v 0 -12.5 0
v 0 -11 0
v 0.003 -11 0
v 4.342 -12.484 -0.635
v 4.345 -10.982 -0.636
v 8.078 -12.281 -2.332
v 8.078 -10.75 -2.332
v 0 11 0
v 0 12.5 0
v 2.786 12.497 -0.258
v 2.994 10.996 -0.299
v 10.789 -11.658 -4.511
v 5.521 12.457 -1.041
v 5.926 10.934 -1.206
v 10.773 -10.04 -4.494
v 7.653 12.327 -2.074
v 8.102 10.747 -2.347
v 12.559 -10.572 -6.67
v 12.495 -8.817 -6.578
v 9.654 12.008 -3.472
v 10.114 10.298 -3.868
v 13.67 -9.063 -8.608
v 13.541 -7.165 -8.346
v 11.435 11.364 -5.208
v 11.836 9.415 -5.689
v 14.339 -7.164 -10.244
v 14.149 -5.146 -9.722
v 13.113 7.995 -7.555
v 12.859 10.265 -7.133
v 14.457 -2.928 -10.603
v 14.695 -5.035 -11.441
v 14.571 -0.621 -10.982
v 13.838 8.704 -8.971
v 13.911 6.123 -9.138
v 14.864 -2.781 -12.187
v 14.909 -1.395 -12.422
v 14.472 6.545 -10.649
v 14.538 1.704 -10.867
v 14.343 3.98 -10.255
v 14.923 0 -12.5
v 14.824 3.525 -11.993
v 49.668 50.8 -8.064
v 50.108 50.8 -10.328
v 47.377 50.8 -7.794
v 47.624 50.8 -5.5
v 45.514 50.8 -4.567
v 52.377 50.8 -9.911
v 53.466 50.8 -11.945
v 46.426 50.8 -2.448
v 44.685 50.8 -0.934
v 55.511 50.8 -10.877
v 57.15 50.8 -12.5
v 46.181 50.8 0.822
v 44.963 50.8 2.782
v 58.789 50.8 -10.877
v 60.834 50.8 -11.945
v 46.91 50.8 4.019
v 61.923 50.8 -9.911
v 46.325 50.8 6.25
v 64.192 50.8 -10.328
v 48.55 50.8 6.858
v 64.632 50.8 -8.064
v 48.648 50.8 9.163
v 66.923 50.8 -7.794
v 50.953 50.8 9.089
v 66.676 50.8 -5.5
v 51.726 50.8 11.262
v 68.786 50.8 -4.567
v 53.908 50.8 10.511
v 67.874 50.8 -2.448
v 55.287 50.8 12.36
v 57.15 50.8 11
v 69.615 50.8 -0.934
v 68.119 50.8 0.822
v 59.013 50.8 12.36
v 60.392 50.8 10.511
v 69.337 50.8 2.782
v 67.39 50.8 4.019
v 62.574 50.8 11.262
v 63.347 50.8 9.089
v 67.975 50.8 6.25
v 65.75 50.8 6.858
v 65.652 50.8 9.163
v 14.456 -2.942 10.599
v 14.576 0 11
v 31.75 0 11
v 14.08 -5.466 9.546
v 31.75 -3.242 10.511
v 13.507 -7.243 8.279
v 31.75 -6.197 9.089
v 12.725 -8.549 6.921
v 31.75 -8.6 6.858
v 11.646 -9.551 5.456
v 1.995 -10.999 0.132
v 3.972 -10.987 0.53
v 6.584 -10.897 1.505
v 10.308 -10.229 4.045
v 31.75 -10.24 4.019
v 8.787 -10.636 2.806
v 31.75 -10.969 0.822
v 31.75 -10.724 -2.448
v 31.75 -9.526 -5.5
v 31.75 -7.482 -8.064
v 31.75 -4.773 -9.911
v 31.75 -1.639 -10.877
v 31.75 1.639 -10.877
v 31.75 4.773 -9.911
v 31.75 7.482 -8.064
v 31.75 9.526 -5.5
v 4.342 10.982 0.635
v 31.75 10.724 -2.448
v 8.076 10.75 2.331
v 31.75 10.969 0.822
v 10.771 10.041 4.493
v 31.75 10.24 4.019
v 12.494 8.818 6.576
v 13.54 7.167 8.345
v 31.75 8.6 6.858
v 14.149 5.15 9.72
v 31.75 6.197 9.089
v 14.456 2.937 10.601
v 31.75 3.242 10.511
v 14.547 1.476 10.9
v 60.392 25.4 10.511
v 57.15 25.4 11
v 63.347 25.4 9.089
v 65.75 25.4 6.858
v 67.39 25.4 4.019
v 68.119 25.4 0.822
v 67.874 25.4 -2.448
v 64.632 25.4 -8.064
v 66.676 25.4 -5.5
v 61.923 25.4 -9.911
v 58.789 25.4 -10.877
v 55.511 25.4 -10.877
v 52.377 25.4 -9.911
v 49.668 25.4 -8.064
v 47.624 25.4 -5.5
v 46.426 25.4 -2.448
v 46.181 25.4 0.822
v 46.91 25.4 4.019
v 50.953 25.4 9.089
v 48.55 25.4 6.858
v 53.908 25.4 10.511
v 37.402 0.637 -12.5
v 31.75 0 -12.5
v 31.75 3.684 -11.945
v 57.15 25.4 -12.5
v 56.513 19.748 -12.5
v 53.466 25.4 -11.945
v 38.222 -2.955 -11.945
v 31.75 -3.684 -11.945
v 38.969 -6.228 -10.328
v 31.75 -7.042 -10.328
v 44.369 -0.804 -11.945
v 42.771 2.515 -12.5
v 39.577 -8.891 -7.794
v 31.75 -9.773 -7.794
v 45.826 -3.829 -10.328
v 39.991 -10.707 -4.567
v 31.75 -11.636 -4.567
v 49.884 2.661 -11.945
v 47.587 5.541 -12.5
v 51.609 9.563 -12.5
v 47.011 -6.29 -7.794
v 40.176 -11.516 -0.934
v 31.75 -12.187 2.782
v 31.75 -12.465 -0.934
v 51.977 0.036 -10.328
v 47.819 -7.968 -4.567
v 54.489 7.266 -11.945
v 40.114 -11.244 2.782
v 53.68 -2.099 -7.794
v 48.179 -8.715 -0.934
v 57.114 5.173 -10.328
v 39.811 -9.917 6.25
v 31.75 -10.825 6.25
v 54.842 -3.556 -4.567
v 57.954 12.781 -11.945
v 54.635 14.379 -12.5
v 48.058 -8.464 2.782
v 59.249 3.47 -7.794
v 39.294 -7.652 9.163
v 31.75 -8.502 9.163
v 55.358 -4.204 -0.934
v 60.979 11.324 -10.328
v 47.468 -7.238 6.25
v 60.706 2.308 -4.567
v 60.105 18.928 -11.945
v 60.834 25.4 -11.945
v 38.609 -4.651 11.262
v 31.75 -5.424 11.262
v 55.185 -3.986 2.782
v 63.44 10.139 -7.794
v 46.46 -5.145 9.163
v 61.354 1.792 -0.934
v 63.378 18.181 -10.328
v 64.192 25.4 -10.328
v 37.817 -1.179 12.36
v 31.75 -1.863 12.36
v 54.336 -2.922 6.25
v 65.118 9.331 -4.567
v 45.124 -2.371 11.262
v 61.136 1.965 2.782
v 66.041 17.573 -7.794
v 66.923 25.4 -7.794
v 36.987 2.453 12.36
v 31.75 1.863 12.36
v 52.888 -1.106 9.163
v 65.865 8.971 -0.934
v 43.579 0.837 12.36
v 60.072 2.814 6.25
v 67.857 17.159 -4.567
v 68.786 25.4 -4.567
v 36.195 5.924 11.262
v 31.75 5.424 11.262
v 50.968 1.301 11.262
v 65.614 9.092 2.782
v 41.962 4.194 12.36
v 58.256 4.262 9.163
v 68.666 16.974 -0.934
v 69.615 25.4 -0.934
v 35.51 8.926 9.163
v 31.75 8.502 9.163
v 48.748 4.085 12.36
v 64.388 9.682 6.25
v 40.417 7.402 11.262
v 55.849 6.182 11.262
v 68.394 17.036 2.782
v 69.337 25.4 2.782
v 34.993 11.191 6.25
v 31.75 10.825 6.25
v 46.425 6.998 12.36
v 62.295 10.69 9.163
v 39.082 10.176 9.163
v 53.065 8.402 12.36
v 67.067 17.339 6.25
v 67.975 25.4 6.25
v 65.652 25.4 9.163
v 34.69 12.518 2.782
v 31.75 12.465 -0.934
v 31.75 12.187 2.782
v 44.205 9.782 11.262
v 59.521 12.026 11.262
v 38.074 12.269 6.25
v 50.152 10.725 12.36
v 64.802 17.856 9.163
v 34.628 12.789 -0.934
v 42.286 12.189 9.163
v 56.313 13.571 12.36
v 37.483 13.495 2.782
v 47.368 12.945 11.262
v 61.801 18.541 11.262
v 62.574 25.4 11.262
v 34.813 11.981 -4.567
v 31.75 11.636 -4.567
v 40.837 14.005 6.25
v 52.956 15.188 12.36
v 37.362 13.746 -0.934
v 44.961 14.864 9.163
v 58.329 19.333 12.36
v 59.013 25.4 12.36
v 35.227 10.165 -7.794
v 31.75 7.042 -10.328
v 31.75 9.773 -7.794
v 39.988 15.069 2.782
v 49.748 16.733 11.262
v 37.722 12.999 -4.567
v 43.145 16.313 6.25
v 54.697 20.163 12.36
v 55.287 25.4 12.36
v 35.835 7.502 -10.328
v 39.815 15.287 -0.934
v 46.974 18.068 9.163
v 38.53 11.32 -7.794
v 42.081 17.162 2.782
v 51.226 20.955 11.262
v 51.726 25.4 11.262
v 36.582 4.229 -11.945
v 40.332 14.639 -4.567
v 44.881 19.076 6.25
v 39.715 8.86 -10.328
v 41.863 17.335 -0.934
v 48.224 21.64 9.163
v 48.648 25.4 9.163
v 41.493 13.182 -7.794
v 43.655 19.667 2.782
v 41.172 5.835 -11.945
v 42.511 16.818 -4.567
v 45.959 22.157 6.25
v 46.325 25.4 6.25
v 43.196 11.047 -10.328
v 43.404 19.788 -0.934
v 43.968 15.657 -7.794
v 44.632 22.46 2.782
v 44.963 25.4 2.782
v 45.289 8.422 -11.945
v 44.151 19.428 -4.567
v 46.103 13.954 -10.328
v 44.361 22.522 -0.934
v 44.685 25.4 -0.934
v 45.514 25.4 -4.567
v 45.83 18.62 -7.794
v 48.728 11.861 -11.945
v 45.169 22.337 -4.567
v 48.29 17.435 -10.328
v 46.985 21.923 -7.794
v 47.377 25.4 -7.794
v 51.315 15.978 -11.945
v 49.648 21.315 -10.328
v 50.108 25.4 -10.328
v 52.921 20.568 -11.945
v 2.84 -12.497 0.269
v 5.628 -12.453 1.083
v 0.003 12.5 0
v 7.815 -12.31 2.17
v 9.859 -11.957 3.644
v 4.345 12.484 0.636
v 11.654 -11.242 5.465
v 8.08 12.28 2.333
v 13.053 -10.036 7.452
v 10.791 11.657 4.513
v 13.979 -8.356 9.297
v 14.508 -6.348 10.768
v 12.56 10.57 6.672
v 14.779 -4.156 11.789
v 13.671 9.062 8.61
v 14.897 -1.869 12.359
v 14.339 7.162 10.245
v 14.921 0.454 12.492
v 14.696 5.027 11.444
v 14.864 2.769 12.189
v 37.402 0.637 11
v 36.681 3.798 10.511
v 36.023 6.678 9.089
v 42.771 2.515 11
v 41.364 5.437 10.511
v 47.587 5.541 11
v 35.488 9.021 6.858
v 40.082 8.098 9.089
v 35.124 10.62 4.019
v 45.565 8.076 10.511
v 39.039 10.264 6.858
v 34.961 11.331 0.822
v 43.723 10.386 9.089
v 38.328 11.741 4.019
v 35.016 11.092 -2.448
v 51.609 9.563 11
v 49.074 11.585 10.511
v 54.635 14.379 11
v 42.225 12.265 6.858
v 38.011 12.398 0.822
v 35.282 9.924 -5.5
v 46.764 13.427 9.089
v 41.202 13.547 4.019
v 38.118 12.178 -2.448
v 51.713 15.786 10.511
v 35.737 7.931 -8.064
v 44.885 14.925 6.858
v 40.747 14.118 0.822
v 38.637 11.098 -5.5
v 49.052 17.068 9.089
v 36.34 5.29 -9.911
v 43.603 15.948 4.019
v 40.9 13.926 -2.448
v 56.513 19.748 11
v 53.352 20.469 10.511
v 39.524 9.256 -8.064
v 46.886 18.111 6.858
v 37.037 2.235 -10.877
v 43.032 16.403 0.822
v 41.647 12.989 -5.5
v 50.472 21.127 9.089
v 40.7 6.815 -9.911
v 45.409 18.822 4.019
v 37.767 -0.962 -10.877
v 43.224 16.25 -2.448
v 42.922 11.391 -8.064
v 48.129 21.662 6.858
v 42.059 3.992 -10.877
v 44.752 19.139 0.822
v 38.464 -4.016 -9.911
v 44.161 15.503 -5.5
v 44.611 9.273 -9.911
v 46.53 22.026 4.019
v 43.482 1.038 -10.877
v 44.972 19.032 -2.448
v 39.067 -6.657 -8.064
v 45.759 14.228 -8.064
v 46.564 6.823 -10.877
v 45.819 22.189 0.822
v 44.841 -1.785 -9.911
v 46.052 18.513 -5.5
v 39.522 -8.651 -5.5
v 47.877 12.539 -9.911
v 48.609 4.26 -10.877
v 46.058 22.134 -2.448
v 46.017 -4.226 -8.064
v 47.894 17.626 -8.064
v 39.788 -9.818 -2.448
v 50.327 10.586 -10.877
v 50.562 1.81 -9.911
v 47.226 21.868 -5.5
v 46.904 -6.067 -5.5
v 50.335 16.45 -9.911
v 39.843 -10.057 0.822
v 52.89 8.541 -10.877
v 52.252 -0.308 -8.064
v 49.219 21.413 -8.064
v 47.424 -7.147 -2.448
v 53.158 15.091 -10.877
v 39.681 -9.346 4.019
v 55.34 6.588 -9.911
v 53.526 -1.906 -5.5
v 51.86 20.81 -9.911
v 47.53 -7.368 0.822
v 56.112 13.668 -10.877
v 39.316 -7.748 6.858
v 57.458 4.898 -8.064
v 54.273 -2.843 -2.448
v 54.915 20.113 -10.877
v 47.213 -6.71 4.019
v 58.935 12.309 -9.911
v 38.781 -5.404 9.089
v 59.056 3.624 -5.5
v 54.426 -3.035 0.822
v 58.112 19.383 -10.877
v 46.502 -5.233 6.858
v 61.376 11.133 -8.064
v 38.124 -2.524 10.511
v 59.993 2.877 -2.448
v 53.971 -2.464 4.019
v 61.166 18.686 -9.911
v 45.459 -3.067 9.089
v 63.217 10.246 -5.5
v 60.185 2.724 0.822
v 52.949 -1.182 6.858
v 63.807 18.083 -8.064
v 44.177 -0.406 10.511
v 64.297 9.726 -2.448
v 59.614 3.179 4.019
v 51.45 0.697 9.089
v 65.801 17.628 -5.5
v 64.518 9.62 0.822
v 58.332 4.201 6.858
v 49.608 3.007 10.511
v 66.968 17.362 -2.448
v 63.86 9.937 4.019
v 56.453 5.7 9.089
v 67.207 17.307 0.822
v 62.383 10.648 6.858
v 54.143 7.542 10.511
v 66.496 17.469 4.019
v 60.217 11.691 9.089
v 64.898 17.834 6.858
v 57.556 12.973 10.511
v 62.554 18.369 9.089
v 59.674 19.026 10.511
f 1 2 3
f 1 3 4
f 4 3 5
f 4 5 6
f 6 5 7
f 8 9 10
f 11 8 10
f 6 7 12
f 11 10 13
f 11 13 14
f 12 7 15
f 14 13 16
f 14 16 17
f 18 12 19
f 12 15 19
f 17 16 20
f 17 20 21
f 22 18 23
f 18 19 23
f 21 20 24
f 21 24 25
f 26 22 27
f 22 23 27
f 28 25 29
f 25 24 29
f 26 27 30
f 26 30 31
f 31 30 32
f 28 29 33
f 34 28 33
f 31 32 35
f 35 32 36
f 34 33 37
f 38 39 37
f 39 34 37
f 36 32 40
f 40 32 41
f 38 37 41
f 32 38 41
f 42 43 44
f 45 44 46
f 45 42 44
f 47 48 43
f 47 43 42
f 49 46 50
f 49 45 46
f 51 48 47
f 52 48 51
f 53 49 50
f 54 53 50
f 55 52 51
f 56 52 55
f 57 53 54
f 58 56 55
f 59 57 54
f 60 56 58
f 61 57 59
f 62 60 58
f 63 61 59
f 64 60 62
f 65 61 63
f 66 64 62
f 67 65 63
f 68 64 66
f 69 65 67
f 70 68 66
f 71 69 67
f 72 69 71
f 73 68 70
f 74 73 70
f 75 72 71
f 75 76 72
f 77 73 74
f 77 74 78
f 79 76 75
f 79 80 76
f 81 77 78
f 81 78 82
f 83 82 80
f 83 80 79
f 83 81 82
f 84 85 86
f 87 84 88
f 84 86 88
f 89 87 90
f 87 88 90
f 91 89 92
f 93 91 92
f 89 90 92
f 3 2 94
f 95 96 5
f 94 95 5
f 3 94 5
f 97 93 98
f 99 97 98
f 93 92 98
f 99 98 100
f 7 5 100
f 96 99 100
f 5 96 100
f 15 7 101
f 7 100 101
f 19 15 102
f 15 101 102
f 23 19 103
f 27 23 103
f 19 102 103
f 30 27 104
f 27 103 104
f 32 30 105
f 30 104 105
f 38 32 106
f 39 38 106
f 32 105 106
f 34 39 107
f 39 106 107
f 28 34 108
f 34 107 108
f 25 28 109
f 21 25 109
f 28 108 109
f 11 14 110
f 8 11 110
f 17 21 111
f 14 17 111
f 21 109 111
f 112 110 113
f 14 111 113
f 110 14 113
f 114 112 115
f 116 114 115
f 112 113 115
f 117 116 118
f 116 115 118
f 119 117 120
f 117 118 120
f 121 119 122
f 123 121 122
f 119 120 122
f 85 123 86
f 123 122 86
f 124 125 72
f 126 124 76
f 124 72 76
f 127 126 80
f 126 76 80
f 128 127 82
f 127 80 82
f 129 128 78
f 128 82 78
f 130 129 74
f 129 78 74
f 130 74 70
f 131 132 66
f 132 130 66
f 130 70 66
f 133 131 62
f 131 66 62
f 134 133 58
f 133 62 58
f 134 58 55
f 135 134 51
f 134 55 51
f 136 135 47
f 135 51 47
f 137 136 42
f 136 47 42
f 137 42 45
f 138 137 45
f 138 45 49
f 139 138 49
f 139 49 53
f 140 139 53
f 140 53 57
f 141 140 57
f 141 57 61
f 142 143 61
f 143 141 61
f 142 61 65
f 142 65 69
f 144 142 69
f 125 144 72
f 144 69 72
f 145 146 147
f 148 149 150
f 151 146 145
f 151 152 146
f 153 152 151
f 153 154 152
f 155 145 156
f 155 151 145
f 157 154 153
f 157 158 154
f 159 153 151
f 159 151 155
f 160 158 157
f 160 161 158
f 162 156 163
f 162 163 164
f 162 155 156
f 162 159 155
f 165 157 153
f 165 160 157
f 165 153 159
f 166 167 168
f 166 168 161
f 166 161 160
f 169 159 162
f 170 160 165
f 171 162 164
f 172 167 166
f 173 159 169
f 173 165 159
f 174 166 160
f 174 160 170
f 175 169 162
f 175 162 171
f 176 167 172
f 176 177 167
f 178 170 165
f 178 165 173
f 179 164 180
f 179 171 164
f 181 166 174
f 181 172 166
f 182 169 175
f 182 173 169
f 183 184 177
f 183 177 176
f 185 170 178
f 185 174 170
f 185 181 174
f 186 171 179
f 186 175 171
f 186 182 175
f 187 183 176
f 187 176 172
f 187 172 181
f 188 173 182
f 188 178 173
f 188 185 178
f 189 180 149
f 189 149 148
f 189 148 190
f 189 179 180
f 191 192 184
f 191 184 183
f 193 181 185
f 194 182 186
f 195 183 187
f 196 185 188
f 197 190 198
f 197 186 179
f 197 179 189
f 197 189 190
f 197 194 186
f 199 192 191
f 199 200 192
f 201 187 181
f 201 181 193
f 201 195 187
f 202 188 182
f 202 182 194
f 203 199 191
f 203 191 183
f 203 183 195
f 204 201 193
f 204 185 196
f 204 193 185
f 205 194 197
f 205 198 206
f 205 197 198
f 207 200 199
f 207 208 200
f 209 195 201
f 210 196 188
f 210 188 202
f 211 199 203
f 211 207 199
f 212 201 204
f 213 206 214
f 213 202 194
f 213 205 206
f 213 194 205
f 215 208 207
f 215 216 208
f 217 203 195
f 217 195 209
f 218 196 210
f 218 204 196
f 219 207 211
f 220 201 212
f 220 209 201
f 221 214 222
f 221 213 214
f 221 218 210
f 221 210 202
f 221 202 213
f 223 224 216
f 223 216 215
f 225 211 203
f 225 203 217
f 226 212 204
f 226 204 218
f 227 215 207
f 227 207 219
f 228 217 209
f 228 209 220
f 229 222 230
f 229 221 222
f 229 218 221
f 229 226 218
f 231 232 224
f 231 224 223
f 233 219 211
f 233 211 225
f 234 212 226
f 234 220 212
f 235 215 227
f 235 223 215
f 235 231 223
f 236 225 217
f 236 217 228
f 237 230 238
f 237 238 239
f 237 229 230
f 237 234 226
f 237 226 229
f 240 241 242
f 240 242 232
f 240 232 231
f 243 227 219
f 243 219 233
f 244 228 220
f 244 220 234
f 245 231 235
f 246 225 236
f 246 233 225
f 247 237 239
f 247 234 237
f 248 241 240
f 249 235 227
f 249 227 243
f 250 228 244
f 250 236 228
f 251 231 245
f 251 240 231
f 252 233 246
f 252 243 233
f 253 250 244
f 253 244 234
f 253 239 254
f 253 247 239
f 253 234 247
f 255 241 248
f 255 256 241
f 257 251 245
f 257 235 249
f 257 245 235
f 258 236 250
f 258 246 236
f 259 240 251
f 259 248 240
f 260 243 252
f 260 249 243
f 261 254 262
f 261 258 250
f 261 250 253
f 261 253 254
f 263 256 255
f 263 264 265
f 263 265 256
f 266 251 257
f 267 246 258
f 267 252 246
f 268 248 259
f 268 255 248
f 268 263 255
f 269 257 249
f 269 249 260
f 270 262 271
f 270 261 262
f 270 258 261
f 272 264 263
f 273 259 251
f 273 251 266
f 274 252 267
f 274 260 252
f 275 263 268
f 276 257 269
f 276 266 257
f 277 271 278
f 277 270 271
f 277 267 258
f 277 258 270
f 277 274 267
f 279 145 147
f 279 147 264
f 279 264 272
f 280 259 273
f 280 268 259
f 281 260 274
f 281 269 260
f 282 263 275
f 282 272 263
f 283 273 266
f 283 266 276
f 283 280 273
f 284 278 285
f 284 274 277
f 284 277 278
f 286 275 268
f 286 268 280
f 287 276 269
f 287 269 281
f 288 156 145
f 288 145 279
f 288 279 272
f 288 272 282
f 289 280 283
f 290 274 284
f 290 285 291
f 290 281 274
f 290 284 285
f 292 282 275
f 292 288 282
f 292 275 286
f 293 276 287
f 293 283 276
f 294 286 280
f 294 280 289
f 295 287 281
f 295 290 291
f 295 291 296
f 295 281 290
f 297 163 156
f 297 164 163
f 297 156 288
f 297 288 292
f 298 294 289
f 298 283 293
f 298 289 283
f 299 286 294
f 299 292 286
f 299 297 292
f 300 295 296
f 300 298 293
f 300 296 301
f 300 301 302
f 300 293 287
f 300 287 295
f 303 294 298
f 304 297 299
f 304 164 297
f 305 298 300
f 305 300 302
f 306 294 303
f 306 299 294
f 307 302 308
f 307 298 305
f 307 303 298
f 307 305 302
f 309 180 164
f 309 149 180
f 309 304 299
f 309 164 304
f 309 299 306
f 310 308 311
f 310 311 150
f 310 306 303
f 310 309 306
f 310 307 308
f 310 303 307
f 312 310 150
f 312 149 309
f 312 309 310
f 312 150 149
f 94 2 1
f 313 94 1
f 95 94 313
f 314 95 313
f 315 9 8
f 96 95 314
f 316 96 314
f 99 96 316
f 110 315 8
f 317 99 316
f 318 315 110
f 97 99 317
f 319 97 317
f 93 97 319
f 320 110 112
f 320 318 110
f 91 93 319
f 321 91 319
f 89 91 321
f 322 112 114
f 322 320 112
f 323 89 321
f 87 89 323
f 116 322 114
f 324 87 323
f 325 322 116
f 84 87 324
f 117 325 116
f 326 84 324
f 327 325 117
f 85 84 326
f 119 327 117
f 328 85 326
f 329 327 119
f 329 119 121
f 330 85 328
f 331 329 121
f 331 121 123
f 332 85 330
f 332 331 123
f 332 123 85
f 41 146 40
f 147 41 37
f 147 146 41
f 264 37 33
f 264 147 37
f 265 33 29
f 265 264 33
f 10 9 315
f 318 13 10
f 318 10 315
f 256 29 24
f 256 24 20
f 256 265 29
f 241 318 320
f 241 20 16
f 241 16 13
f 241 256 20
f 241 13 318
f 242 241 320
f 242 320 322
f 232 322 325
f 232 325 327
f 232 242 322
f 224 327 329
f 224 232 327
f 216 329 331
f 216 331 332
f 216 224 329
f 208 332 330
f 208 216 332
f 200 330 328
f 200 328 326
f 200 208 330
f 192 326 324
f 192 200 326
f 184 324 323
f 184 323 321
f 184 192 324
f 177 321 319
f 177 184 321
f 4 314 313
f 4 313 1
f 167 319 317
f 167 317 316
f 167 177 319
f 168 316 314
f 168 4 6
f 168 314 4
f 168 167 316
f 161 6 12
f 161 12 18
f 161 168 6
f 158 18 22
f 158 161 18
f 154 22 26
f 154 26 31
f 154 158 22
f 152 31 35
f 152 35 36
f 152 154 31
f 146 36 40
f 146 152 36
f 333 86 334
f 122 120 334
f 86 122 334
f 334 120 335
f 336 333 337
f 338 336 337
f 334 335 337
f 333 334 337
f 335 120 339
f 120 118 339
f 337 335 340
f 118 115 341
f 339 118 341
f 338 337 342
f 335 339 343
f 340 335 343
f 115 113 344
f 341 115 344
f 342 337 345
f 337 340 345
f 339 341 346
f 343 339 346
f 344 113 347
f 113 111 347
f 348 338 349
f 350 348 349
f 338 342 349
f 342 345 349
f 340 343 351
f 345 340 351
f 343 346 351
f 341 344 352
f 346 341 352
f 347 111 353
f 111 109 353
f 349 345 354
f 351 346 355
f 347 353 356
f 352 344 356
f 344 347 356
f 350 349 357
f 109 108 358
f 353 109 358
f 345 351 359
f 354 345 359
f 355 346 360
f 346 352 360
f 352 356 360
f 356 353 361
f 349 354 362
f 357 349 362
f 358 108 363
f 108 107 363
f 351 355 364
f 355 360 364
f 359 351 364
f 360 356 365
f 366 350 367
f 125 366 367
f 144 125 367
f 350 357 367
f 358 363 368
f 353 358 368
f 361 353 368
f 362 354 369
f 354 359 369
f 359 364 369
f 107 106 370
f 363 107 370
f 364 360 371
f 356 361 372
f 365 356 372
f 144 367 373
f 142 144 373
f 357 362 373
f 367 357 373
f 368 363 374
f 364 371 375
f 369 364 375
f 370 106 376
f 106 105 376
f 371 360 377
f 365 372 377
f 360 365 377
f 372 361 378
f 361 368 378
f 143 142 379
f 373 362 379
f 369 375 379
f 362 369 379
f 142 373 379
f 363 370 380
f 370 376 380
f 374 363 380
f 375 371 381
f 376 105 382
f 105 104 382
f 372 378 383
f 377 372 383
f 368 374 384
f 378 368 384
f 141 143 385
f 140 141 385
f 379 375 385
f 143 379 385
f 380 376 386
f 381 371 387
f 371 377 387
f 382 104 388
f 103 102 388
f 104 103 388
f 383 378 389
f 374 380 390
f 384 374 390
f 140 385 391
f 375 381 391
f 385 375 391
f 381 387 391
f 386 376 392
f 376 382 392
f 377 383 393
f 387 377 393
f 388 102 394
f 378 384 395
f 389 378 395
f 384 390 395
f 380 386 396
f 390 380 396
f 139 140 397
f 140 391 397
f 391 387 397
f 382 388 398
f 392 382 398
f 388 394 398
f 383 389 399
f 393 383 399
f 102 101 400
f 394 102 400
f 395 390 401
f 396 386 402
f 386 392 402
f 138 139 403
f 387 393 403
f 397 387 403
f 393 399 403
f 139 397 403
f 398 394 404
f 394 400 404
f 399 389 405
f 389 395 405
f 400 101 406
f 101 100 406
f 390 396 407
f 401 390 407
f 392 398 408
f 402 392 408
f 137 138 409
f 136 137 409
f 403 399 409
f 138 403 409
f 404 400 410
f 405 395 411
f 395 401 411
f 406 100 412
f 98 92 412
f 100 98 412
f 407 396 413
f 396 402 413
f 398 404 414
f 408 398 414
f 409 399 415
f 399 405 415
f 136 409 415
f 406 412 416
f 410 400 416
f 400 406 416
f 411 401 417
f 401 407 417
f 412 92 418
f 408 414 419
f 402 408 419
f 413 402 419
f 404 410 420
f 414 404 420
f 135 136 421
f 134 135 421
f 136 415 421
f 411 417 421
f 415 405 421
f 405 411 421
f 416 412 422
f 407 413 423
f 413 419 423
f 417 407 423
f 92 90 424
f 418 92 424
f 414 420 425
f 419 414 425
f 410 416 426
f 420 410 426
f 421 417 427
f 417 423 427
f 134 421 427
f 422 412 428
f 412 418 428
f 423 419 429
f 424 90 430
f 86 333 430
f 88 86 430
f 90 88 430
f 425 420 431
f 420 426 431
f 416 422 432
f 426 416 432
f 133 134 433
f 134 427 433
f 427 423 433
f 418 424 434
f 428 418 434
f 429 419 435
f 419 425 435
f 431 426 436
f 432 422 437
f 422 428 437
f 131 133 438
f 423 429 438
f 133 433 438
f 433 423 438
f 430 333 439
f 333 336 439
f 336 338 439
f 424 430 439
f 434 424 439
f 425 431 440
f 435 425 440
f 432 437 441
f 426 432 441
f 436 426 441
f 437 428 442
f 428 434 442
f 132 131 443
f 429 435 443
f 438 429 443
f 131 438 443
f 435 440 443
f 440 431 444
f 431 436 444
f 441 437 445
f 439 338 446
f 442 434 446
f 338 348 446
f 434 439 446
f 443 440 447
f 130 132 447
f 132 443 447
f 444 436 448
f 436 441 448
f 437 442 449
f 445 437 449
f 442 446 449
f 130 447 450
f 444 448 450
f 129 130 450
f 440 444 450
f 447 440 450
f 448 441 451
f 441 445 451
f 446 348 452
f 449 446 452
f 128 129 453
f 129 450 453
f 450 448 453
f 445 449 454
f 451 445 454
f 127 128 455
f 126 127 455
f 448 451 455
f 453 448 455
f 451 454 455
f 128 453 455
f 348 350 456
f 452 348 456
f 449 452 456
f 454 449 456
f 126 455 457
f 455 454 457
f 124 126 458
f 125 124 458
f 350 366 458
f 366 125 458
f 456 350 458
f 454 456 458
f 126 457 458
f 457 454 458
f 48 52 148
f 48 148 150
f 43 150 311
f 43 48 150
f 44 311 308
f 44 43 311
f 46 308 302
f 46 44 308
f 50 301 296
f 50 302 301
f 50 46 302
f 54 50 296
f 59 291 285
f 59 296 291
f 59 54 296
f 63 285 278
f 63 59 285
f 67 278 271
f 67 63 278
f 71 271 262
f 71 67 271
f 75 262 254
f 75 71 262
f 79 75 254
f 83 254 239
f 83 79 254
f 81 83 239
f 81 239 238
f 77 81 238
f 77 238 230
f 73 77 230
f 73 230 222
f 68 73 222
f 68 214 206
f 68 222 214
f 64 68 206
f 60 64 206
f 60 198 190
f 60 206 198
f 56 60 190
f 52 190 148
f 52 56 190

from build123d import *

# Parameters (mm, degrees)
SKETCH1_R          = 12.5
SKETCH3_R          = 11
SKETCH7_R          = 15.157577
CUT_EXTRUDE1_DEPTH = 81.367795269


with BuildPart() as part:
    # Sweep1: sweep along a path in Sketch2
    with BuildLine(Plane.XY) as sweep1_path:
        Line((0, 0), (31.75, 0))
        ThreePointArc((31.75, 0), (49.710512242, 7.439487758), (57.15, 25.4))
        Line((57.15, 25.4), (57.15, 50.8))
    # Sketch1 → Sweep1 (sweep)
    with BuildSketch(Plane(origin=(0, 0, 0), x_dir=(0, 0, -1), z_dir=(1, 0, 0))):
        Circle(SKETCH1_R)
    sweep(path=sweep1_path.line)

    # Cut-Sweep1: sweep along a path in Sketch2<2>
    with BuildLine(Plane.XY) as cut_sweep1_path:
        Line((0, 0), (31.75, 0))
        ThreePointArc((31.75, 0), (49.710512242, 7.439487758), (57.15, 25.4))
        Line((57.15, 25.4), (57.15, 50.8))
    # Sketch3 → Cut-Sweep1 (sweep, cut)
    with BuildSketch(Plane.ZY):
        Circle(SKETCH3_R)
    sweep(path=cut_sweep1_path.line, mode=Mode.SUBTRACT)

    # Sketch7 → Cut-Extrude1 (cut, through all)
    with BuildSketch(Plane(origin=(0, 12.7, 0), x_dir=(1, 0, 0), z_dir=(0, 1, 0))):
        with Locations((0, 15.157577)):
            Circle(SKETCH7_R)
    cut_extrude1 = extrude(amount=-CUT_EXTRUDE1_DEPTH, mode=Mode.SUBTRACT)

    # Mirror1: Cut-Extrude1 across plane
    add(cut_extrude1.mirror(Plane.XY), mode=Mode.SUBTRACT)


solid = part.part
